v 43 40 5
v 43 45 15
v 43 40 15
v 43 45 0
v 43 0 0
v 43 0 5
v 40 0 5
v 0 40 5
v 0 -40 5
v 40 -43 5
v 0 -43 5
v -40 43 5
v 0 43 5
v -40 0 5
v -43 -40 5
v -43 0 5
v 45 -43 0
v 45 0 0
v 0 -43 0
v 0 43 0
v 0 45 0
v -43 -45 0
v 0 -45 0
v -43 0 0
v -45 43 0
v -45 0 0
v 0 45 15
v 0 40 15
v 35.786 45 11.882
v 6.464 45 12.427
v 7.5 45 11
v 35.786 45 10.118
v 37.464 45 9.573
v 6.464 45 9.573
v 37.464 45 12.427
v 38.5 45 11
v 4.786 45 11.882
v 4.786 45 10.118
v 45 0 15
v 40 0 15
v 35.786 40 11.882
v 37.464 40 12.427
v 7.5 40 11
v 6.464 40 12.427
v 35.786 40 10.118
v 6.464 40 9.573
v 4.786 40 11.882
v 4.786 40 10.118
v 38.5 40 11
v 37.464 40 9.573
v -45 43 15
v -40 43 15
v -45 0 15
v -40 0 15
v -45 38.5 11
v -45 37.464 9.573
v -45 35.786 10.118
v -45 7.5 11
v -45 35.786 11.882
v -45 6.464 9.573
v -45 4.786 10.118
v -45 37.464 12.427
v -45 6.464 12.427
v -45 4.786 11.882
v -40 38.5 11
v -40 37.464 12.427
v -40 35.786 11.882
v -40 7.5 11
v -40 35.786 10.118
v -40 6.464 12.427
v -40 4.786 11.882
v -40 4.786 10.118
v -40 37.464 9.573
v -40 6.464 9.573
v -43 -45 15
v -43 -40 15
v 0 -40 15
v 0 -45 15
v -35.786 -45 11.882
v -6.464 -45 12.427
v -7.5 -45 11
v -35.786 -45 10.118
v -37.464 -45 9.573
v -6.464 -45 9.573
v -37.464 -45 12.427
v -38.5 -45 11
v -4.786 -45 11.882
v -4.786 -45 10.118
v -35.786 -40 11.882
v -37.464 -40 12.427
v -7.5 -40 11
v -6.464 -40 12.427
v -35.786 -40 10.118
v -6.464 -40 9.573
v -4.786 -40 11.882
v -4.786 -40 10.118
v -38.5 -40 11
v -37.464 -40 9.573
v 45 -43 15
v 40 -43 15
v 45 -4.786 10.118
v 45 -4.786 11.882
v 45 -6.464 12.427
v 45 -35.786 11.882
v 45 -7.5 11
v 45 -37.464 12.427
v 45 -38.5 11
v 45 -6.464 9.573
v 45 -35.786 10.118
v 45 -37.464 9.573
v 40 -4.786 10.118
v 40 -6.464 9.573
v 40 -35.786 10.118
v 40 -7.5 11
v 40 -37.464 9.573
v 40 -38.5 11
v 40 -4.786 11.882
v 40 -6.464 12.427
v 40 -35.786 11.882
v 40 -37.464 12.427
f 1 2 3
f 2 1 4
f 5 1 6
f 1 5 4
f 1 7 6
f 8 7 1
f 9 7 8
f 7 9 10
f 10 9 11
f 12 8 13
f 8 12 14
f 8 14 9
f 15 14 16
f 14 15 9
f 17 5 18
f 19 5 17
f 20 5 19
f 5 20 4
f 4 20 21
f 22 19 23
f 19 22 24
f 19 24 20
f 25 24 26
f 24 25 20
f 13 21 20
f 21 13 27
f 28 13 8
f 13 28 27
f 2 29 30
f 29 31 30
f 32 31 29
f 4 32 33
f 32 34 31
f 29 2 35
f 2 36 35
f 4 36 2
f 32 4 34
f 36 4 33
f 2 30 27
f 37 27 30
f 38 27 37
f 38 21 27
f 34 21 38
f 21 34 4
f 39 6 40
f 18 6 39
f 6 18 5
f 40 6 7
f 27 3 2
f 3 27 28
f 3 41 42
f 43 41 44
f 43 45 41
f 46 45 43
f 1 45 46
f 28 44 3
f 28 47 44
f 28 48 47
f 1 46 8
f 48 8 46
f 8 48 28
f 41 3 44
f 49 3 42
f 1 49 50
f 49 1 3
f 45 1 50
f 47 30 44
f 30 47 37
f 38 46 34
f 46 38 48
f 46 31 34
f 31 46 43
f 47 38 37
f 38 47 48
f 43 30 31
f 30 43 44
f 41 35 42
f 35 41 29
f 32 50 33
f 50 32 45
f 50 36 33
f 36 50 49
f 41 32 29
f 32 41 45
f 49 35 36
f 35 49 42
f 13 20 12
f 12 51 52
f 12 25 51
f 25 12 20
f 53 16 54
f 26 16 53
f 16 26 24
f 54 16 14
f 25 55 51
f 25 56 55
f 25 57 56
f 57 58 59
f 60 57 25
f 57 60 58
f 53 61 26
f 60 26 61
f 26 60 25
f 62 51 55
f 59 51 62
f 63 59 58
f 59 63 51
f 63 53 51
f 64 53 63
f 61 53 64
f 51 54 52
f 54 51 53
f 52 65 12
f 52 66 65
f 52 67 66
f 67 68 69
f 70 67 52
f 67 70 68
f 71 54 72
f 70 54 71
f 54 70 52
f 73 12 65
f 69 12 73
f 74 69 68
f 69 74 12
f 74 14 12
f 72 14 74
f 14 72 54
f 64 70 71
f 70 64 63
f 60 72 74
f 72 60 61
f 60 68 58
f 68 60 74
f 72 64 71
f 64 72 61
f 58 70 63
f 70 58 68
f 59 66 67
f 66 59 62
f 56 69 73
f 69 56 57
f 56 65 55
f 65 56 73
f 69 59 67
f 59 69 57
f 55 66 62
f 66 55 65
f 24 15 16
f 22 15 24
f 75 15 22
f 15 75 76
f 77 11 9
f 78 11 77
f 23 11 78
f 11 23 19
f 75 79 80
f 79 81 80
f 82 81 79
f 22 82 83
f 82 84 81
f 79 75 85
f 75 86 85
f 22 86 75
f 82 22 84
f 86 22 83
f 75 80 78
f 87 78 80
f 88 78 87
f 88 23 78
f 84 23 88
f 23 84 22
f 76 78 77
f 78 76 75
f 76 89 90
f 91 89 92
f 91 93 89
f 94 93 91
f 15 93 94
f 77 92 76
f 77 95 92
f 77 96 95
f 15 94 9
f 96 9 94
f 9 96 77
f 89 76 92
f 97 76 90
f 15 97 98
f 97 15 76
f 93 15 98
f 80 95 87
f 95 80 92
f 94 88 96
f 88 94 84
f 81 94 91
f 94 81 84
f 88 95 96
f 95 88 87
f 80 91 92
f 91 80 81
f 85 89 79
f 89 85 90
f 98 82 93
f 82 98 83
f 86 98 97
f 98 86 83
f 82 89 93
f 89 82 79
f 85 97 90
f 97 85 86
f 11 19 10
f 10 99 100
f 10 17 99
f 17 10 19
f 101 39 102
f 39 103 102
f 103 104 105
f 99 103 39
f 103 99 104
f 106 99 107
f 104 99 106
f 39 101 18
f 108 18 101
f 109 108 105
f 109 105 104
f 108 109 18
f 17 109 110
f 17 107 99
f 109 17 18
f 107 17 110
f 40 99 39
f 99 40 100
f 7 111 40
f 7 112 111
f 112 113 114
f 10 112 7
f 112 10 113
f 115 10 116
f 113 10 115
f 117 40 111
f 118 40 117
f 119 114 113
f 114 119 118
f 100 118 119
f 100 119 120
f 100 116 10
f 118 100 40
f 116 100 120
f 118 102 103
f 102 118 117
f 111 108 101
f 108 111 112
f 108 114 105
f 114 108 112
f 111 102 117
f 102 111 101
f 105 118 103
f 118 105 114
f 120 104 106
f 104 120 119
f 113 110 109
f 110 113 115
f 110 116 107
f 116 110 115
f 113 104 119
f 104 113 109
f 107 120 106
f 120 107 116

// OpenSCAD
module nema17(length) {
	difference() {
		union() {
			// Base
			translate([0, 0, -length/2])
				cube([42.3, 42.3, length], center = true);
	
			// Shaft
			cylinder(d = 5, h = 24);

			// Motor flat
			cylinder(d = 22, h = 2);
		}

		// Mount Holes
		for(x = [-31/2, 31/2])
			for(y = [-31/2, 31/2])
				translate([x,  y, -4.5])
					cylinder(d = 3, h = 4.5);
	}
}

module plus() {
	length = 40;
	for(theta = [0:90:270])
		rotate([0, 0, theta]) {
			// Motor
			//translate([0, length + 43/2, 42/2 + 5]) rotate([-90, 0, 0]) nema17(length = length);

			difference() {
				union() {
					// Base
					translate([-(43)/2, 0, 0])
						cube([43, length + 43/2 + 5, 5]);

					// Motor Ears
					translate([-(43)/2, length + 43/2, 0])
						cube([43, 5, 15]);
				}

				for(x = [-31/2, 31/2])
					translate([x, length + 43/2, 5 + 43/2 - 31/2])
						rotate([-90, 0, 0])
							cylinder(d = 3, h = 5);
			}
		}
}

module square() {
	length = 40;
	for(theta = [0:90:270])
		rotate([0, 0, theta]) {
			// Motor
			//translate([43/2, length, 42/2 + 5]) rotate([-90, 0, 0]) nema17(length = length);

			difference() {
				union() {
					// Base
					translate([0, 0, 0])
						cube([43, length + 5, 5]);

					// Motor Ears
					translate([0, length, 0])
						cube([43, 5, 15]);
				}

				#for(x = [-31/2, 31/2])
					translate([x + 43/2, length, 5 + 43/2 - 31/2])
						rotate([-90, 0, 0])
							cylinder(d = 3, h = 5);
			}
		}
}

square();
